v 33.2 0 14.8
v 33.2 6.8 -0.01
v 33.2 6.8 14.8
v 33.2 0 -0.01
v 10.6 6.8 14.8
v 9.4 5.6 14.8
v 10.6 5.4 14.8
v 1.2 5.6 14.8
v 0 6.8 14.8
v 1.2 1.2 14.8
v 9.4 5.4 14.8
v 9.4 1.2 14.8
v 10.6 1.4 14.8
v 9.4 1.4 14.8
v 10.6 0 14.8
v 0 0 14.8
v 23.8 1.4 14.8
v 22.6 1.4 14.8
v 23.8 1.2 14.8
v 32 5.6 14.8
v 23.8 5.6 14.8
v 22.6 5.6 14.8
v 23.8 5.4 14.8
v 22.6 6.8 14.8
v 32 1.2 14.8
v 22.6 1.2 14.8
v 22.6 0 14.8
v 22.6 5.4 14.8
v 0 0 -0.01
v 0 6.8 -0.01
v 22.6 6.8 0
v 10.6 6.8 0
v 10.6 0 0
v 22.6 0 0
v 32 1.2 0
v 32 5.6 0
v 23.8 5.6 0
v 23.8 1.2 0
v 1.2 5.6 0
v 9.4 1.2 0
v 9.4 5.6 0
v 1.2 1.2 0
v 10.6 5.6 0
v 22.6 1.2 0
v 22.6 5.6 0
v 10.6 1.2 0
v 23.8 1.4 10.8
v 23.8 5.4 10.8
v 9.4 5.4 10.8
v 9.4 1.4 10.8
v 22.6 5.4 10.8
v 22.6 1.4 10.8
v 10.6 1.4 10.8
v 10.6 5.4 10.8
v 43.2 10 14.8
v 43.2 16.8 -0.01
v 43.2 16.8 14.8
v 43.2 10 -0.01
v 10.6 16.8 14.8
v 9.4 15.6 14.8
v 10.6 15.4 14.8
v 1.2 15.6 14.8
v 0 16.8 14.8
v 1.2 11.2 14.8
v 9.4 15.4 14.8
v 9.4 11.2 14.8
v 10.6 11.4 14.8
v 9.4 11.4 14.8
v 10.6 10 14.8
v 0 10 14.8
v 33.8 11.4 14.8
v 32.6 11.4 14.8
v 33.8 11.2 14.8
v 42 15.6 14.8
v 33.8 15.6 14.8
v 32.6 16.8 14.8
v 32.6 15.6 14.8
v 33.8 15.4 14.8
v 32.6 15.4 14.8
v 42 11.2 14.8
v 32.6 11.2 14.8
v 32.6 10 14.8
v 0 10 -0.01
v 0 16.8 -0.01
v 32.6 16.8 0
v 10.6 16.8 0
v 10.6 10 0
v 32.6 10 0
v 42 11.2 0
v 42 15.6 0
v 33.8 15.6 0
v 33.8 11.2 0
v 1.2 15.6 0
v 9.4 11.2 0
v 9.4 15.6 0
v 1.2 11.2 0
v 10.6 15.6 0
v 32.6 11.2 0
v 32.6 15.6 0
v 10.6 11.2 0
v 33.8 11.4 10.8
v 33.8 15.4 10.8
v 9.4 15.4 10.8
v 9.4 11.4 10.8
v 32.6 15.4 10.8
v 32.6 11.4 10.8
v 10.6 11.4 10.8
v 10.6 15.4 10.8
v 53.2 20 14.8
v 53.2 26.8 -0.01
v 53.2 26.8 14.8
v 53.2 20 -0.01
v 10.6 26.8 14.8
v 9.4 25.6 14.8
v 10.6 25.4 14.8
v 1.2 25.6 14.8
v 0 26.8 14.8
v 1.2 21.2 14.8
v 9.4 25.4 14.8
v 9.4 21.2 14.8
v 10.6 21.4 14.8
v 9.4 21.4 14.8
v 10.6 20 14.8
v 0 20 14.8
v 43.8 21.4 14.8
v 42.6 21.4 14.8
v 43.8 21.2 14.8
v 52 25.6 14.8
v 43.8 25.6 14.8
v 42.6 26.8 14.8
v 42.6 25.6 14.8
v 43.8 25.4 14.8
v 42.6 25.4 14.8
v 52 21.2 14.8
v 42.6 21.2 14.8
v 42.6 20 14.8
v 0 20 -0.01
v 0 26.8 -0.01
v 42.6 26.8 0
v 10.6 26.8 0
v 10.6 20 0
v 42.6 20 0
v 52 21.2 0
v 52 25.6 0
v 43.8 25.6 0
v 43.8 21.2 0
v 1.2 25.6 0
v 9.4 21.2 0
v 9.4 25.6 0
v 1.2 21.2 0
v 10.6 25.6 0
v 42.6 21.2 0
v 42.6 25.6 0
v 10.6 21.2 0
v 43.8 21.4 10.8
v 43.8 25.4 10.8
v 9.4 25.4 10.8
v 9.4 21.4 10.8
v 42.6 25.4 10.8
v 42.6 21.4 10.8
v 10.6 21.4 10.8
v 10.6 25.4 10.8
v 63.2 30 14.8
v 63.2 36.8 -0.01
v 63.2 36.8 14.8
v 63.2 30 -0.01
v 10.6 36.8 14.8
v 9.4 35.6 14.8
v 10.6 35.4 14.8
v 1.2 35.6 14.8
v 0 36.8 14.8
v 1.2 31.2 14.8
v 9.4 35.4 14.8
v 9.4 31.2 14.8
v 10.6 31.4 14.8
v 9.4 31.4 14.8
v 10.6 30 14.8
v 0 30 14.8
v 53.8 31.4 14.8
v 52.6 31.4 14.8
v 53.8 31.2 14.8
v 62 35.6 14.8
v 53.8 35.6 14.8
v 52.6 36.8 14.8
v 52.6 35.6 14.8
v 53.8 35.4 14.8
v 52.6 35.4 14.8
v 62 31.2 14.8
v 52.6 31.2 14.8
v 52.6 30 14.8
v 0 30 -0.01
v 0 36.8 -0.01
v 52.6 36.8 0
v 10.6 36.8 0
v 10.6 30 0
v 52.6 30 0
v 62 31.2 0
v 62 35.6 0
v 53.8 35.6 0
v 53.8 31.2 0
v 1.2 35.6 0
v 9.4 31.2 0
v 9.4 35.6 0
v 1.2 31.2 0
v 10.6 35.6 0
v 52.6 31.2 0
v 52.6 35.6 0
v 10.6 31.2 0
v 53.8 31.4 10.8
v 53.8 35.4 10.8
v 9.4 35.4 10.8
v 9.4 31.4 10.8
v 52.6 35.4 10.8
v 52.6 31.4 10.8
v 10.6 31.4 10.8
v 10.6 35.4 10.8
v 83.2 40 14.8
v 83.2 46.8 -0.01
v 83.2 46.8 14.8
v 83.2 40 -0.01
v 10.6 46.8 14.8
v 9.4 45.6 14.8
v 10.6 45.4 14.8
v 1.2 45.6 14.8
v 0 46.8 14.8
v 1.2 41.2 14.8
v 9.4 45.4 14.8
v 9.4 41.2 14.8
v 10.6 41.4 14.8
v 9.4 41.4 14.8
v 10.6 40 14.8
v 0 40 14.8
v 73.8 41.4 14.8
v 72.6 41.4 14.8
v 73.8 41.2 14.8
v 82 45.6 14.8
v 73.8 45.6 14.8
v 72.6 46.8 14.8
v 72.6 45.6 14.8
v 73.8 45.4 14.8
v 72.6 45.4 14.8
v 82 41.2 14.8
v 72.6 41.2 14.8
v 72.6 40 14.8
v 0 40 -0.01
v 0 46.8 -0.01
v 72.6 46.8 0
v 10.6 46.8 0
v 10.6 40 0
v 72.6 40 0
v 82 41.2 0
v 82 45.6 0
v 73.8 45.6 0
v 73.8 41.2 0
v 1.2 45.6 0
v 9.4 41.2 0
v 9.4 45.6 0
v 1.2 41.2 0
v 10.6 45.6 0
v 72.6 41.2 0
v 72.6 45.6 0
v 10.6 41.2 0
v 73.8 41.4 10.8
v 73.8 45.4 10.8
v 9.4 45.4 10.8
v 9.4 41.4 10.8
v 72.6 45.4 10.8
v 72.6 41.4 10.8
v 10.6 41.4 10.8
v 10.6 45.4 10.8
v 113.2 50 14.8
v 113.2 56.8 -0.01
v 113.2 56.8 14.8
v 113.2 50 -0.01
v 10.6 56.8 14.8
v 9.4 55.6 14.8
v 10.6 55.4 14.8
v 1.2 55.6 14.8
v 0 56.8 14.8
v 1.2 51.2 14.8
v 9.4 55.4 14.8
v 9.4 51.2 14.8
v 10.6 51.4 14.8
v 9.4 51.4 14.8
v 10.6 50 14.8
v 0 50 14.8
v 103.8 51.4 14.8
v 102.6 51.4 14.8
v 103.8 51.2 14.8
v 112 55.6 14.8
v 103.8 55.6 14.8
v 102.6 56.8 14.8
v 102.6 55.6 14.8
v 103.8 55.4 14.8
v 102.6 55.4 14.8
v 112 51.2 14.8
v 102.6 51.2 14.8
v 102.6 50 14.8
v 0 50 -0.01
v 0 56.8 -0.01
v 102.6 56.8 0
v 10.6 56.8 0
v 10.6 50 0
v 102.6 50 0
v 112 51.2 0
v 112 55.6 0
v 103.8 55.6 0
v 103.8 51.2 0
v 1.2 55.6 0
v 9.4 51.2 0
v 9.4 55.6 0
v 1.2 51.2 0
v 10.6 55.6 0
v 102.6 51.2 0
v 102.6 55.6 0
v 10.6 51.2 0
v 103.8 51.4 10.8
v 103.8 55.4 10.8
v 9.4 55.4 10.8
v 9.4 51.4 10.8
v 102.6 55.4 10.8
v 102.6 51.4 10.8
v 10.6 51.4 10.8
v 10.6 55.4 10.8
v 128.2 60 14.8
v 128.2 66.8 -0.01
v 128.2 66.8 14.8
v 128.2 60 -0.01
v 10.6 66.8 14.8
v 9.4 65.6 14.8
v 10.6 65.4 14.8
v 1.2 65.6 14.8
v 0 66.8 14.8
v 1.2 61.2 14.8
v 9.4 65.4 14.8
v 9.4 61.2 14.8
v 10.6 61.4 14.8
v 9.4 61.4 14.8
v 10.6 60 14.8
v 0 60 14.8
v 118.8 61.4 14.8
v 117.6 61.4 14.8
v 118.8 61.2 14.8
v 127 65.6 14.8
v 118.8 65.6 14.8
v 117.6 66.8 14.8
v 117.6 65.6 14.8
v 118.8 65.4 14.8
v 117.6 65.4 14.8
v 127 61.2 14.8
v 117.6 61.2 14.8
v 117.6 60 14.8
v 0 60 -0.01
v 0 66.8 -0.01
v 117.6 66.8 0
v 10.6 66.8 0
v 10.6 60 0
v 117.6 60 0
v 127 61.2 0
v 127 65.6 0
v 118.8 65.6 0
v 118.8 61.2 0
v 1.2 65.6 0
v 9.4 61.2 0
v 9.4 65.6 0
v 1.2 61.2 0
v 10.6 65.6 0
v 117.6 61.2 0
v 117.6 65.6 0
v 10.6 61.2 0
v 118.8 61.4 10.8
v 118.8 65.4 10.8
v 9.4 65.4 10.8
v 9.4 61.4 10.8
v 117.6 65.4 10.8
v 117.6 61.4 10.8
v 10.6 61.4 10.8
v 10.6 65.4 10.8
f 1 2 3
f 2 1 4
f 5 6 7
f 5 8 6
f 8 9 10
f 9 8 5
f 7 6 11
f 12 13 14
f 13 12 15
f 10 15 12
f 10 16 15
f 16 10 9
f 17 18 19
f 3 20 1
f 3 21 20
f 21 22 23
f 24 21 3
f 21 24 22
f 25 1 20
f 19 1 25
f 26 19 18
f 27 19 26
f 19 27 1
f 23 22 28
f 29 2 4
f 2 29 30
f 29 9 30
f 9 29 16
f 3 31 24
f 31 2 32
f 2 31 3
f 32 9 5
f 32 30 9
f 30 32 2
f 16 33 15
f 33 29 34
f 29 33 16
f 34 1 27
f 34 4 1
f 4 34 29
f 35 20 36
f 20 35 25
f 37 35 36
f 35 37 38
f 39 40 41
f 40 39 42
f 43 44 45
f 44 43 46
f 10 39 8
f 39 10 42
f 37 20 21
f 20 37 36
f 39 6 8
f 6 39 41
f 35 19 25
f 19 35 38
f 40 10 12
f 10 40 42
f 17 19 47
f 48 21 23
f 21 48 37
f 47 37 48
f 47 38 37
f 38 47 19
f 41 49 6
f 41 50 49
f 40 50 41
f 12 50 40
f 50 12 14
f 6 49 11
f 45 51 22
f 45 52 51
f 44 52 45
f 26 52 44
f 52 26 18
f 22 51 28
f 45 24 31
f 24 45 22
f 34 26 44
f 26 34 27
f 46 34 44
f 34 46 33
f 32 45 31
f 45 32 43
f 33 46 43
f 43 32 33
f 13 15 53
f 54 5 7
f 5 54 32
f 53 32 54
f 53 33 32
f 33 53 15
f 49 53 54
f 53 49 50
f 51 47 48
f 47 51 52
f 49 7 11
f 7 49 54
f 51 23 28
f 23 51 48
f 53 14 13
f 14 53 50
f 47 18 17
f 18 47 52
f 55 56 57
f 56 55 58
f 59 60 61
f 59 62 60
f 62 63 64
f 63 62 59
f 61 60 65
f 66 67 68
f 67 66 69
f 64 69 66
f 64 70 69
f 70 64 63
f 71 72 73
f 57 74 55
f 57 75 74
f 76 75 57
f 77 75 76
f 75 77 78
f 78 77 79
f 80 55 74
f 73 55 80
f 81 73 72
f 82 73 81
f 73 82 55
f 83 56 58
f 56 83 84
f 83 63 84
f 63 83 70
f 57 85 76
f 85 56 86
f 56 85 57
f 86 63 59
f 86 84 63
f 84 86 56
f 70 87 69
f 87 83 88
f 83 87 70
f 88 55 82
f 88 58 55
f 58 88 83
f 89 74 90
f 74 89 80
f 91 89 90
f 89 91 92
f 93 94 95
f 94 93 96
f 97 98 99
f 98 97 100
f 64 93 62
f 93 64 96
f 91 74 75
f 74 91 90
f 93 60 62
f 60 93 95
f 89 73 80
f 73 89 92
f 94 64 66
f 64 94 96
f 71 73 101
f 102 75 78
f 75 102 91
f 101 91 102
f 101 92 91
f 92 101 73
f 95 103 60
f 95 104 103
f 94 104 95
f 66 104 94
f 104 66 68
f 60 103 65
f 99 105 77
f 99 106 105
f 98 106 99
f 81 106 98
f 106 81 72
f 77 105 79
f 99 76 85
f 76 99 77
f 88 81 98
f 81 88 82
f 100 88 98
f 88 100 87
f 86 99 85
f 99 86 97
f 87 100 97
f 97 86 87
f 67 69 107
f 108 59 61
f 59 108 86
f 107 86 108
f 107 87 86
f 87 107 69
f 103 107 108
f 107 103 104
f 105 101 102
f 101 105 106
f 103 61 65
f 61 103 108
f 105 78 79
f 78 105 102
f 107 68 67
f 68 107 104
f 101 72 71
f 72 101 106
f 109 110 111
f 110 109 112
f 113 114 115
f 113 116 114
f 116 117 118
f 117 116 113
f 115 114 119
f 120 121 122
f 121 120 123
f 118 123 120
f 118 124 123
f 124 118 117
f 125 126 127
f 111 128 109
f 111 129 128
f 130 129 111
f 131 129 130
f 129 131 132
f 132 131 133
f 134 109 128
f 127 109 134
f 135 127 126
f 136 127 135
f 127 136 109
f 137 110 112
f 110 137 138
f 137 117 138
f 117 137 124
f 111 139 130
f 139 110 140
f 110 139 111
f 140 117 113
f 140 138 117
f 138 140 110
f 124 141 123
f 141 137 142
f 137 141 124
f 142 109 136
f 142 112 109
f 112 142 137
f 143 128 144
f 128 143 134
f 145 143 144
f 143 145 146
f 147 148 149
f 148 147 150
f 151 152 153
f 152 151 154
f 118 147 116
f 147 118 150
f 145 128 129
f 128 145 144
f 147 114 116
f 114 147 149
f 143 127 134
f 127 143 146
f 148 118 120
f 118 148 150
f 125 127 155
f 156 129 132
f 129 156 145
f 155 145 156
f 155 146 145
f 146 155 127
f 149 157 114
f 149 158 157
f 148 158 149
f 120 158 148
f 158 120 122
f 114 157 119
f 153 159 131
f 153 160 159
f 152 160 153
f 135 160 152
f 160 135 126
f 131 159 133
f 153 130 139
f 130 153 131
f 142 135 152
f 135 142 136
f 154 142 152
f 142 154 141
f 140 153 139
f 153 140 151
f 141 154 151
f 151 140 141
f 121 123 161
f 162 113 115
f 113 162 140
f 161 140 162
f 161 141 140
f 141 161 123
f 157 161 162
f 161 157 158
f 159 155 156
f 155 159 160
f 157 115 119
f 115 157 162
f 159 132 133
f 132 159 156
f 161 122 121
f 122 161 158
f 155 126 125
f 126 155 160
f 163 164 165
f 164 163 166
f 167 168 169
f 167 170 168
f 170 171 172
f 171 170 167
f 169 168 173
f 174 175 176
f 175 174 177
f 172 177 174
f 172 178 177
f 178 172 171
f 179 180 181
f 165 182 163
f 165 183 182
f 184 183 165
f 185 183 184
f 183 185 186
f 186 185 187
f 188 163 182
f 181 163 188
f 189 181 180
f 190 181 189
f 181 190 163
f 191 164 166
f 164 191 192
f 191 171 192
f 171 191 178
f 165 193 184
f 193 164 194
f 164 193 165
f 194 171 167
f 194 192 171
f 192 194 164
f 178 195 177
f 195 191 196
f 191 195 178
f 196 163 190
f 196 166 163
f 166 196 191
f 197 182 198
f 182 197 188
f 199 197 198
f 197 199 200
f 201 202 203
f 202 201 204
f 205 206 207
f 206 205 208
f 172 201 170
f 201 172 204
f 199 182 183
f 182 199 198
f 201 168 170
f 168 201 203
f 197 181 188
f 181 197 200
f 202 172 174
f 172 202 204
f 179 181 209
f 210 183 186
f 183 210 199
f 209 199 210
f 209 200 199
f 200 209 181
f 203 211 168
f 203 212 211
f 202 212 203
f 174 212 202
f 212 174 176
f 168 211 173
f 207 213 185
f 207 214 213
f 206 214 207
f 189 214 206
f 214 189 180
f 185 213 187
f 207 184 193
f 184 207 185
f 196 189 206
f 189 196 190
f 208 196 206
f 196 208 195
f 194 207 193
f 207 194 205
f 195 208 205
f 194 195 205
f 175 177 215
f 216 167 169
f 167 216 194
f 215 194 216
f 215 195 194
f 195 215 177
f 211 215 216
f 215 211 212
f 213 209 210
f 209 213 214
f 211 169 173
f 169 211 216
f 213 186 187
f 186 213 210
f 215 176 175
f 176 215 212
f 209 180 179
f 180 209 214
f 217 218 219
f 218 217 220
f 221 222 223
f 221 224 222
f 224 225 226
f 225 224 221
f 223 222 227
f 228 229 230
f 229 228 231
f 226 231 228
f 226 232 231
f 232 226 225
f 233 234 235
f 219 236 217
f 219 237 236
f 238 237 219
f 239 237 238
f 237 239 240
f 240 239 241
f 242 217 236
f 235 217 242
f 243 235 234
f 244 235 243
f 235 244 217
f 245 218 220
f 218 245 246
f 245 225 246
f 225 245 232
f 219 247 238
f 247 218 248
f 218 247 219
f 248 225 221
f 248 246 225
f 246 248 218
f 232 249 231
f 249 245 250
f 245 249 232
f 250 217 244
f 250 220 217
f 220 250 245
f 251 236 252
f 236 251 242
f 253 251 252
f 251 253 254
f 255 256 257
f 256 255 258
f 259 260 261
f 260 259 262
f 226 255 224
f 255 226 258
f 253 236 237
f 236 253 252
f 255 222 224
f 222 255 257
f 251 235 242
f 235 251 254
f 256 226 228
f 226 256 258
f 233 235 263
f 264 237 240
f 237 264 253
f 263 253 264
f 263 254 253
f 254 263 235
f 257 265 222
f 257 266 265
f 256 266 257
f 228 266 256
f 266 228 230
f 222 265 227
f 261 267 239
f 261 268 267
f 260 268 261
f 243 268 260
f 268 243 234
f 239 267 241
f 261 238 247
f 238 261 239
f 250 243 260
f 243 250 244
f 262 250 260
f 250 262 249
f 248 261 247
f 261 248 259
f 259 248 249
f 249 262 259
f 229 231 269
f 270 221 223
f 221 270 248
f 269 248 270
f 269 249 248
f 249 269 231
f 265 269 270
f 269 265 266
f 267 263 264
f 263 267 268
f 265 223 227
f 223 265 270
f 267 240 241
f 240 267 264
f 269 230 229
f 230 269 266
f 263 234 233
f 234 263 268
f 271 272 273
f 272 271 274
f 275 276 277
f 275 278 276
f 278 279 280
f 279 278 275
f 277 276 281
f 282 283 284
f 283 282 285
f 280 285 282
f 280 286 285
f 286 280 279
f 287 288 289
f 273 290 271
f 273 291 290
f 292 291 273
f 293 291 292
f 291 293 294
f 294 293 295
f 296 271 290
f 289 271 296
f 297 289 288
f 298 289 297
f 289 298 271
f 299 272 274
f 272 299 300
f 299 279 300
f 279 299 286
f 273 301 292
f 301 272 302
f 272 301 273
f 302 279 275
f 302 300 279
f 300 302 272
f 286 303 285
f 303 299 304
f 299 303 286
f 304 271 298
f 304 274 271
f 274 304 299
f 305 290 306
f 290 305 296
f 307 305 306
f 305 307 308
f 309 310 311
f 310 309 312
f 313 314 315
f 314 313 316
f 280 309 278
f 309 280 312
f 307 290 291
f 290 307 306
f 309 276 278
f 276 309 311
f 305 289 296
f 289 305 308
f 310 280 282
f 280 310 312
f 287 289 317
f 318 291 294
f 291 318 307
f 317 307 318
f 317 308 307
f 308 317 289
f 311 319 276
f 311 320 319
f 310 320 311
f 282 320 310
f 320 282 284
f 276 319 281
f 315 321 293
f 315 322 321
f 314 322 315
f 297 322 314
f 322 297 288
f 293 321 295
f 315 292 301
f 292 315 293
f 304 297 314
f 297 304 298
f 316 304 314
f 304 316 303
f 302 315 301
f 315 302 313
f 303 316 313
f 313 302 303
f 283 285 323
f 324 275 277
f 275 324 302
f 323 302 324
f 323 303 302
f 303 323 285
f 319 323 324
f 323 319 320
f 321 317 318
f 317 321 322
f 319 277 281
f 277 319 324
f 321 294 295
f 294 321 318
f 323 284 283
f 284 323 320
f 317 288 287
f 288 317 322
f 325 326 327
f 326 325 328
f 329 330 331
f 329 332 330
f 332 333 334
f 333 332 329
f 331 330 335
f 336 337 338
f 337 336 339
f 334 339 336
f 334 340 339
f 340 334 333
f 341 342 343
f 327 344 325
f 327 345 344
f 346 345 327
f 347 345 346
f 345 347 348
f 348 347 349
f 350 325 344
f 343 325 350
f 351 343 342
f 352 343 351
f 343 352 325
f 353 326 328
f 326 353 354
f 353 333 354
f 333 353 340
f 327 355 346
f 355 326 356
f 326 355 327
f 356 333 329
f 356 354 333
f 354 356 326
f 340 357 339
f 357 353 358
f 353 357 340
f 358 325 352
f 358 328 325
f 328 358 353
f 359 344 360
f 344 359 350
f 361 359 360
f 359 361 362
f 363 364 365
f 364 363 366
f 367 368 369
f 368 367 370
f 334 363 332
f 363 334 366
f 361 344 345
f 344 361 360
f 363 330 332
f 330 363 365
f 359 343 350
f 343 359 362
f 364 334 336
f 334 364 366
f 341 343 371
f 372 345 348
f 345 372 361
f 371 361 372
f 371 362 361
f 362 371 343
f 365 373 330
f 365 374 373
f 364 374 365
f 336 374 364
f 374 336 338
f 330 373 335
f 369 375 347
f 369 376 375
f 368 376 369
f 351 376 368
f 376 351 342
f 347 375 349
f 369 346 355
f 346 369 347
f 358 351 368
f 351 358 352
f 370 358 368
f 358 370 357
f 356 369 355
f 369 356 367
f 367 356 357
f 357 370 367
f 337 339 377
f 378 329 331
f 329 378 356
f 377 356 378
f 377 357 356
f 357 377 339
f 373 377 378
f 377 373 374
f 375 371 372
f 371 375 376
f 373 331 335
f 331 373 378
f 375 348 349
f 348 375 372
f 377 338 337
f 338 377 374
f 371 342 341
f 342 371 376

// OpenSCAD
// file: ../../Base/Boxes.scad
// Fischertechnik Box Foundation
// Pre-designed Boxes

use <Constants.scad>

include <PlacementOptions.scad>

box190Width = 190;
box190Depth = 130;
box130Width = 130;
box130Depth = 95;
boxUsageHeight = 33.9;
boxWallThickness = 2.4;
boxBaseThickness = 1.0;

// getBoxWallThickness()
// Gets the wall thickness of a Fischertechnik Box

function getBoxWallThickness() = boxWallThickness;

// Gets the usable height of a fischertechnik box
function getBoxUsageHeight() = boxUsageHeight;

// Gets the thickness of the Fischertechnik box base.
function getBoxBaseThickness() = boxBaseThickness;

// Gets the usable inner space of a Box 190 as an x/y-list
function getBox190Space() = [
    box190Width - 2*getBoxWallThickness(), 
    box190Depth - 2*getBoxWallThickness() ];

// Imports the Fischertechnik empty box 130x190 mm and places it at position 0,0
// 190x130 are the outer sizes, the inner space is slightly smaller. Use getBox190Space() to get the inner sizes.
// This module needs the STL file "Fischertechnik Box 130x190.stl" in the library path.
// The box is positioned that the usable inner space is at the 0,0,0 position. The

module Box190() {
    translate([-getBoxWallThickness(),-getBoxWallThickness(),-getBoxBaseThickness()])
        import("Fischertechnik Box 130x190.stl", convexity=3);
}

// Gets the usable inner space of a Box 130 as an x/y-list
function getBox130Space() = [
    box130Width - 2*getBoxWallThickness(), 
    box130Depth - 2*getBoxWallThickness() ];

// Imports the Fischertechnik empty box 95x130 mm and places it at position 0,0
// 190x130 are the outer sizes, the inner space is slightly smaller. Use getBox190Space() to get the inner sizes.
// This module needs the STL file "Fischertechnik Box 95x130.stl" in the library path.
// The box is positioned that the usable inner space is at the 0,0,0 position. The

module Box130() {
    translate([-getBoxWallThickness(),-getBoxWallThickness(),-getBoxBaseThickness()])
        import("Fischertechnik Box 95x130.stl", convexity=3);
}

// Creates a web at the specified box walls
// corner 0 = LowerLeft, 1 = UpperLeft, 2 = UpperRight, 3 = LowerRight
// side 0 = LeftOfCorner, 1 = RightOfCorner
// distance = Distance in mm from the corner
// box = inner width and depth of the box (default: Box 190)
// webWidth = length of the web (default is 3 mms)
// webThickness = thickness of the web (default is 1 mm)

module BoxWeb(corner, side, distance, box=getBox190Space(), webWidth=3, webThickness=1.0) {
    sink = getBoxWallThickness()/2;

    width = (corner % 2 == 0) ? 
            (side == LeftOfCorner ? webWidth : webThickness) :
            (side == LeftOfCorner ? webThickness : webWidth);

    depth = (corner % 2 == 0) ? 
            (side == RightOfCorner ? webWidth : webThickness) :
            (side == RightOfCorner ? webThickness : webWidth);
    
    xDiff = corner == LowerLeft ? 
                (side == LeftOfCorner ? -sink : distance) :
            (corner == UpperLeft ?                
                (side == LeftOfCorner ? distance : -sink) :
            (corner == UpperRight ?
                (side == LeftOfCorner ? box.x-webWidth+sink : box.x-distance-webThickness) :
                (side == LeftOfCorner ? box.x-distance-webThickness: box.x-webWidth+sink)));

    yDiff = corner == LowerLeft ? 
                (side == RightOfCorner ? -sink : distance) :
            (corner == UpperLeft ?
                (side == RightOfCorner ? box.y-distance : box.y-webWidth+sink) :
            (corner == UpperRight ?
                (side == RightOfCorner ? box.y-webWidth+sink : box.y-distance) :
                (side == RightOfCorner ? distance : -sink)));
    
    translate([xDiff, yDiff, -getExcess()])
        cube([width, depth, boxUsageHeight + 2*getExcess()]);
}
// file: ../../Base/Rotation.scad
// Fischertechnik Box Foundation
// Geometry Helpers Rotation

include <PlacementOptions.scad>

// getRotatedSpace(space, rotation=NoRotation)
// Rotates the space dependent on the specified rotation

function getRotatedSpace(space, rotation=NoRotation) = [
    (rotation == Rotate90 || rotation == Rotate270) ? space.y : space.x,
    (rotation == Rotate90 || rotation == Rotate270) ? space.x : space.y
];

// Rotates the given space around the fixed left lower corner
// space = the space the children needs as width/depth list [width,depth]
// rotation = 0 Rotate0 degrees, 1 Rotate90 degrees, 2 Rotate180 degrees, 3 Rotate270 degrees (equivalent to -90)

module RotateFix(space, rotation=Rotate0) {
    dy = (rotation == Rotate0 || rotation == Rotate270) ? 0 :
        (rotation == Rotate90) ? space.x :
        space.y;
    dx = (rotation < Rotate180) ? 0 :
        (rotation == Rotate180) ? space.x :
        space.y;
    
    translate([dx, dy, 0])
        rotate([0, 0, rotations[rotation]])
            children();
}
// file: ../../Base/Alignment.scad
// Fischertechnik Box Foundation
// Geometry Helpers Alignment

include <PlacementOptions.scad>

// getAlignedX(elementWidth, spaceWidth, align=AlignRight, offset=0)
// Gets the aligned X offset of an element with the given
// width in the given space.
// elementWidth = The width of the element to positon
// spaceWidth = The space where the element should be aligned
// align = 0 AlignLeft, 1 AlignCenter, 2 AlignRight
// offset = an optional offset from the aligned position. When
// aligned left or centered, then positive values are in X direction.
// When aligned right then positive values are in negative X direction.

function getAlignedX(elementWidth, spaceWidth, align=AlignRight, offset=0) =
    (align == AlignLeft) ?
        offset :
        ((align == AlignCenter) ?
        (spaceWidth - elementWidth)/2 + offset :
        spaceWidth - offset - elementWidth);

// getAlignedY(elementDepth, spaceDepth, align=AlignTop, offset=0)
// Gets the aligned Y offset of an element with the given
// depth in the given space.
// elementDepth = The depth of the element to positon
// spaceDepth = The space where the element should be aligned
// align = 0 AlignBottom, 1 AlignCenter, 2 AlignTop
// offset = an optional offset from the aligned position. When
// aligned bottom or centered, then positive values are in Y direction.
// When aligned top then positive values are in negative Y direction.

function getAlignedY(elementDepth, spaceDepth, align=AlignTop, offset=0) =
    (align == AlignBottom) ?
        offset :
        ((align == AlignCenter) ?
        (spaceDepth - elementDepth)/2 + offset :
        spaceDepth - offset - elementDepth);
// file: ../../Base/PlacementOptions.scad
// Fischertechnik Box Foundation
// Placement Options

// Alignment
NoAlign = 0;
AlignLeft = 1;
AlignBottom = 2;
AlignCenter = 3;
AlignRight = 4;
AlignTop = 5;

// Element rotation degree steps
rotations = [0, -90, -180, -270];

// Rotation
NoRotation = 0;
Rotate0 = 0;
Rotate90 = 1;
Rotate180 = 2;
Rotate270 = 3;

// Docking (seen from above)
NoDock = -1;
DockLeft = 0;
DockTop = 1;
DockRight = 2;
DockCorner = 2;
DockBottom = 3;

// Web corners
LowerLeft = 0;
UpperLeft = 1;
UpperRight = 2;
LowerRight = 3;

// Web position relative to corner
LeftOfCorner = 0;
RightOfCorner = 1;
// file: ../../Base/Placement.scad
// Fischertechnik Box Foundation
// Geometry Helpers Placement

use <Constants.scad>
use <Alignment.scad>
use <Rotation.scad>
use <Boxes.scad>

include <PlacementOptions.scad>

// Place(x=0, y=0, elementSpace=[0,0], alignX=AlignLeft, alignY=AlignBottom, rotation=Rotate0, boxSpace=getBox190Space())
// Places the child at the specified position
// y = Y-Position. This is a relative position when an X aligment is specified.
// x = X-Position. This is a relative position when an Y aligment is specified.
// elementSpace = space of the element to be placed [x,y]
// alignX = -1=NoAlign, 0 AlignLeft, 1 AlignCenter, 3 AlignRight (elementSpace and boxSpace required!)
// alignY = -1=NoAlign, 2 AlignBottom, 1 AlignCenter, 4 AlignTop (elementSpace and boxSpace required!)
// rotation = 0 Rotate0 0 degrees, 1 Rotate90 90 degrees, 
// 2 Rotate180 180 degrees, 3 Rotate270 270 degrees (equivalent to -90)
// boxSpace = Inner space of the box where the placement occurs [x,y] - default is Box 190x130 inner space

module Place(x=0, y=0, elementSpace=[0,0], 
  alignX=AlignLeft, alignY=AlignBottom, 
  rotation=NoRotation, boxSpace=getBox190Space()) {

    module Position(x, y, space, rotation=Rotate0) {
        translate([x, y, 0])
            RotateFix(space, rotation)
                children(0);
    }

    space = getRotatedSpace(elementSpace, rotation);
    alignedX = getAlignedX(space.x, boxSpace.x, alignX, x);
    alignedY = getAlignedY(space.y, boxSpace.y, alignY, y);
    Position(alignedX, alignedY, elementSpace, rotation)
        children(0);
}

// Center(space=getBox130Space(), elementSpace=[0,0])
// space = Space where the children is centered. For cylinder use centered=true and no elementSpace.
// elementSpace = space of the element to be centered [x,y]

module Center(space=getBox190Space(), elementSpace=[0,0]) {
    translate([(space.x - elementSpace.x) / 2, (space.y - elementSpace.y) / 2])
        children(0);
}

// CenterHorizontal(width=0, y=0, offset=0, space=getBox130Space())
// space = Space where the children is centered. For cylinder use centered=true and no elementSpace.
// elementSpace = space of the element to be centered [x,y]

module CenterHorizontal(width=0, y=0, offset=0, space=getBox190Space()) {
    translate([(space.x - width) / 2 + offset, y])
        children(0);
}

// CenterVertical(depth=0, x=0, offset=0, space=getBox130Space())
// space = Space where the children is centered. For cylinder use centered=true and no elementSpace.
// elementSpace = space of the element to be centered [x,y]

module CenterVerticalal(depth=0, x=0, offset=0, space=getBox190Space()) {
    translate([x, (space.y - depth) / 2 + offset])
        children(0);
}
// file: ../../Base/Constants.scad
// Fischertechnik Box Foundation
// Constants

// Constant values necessary for multiple elements

// Base constants
dividerThickness = 1.2;
excess = 0.01;
fragments = 90;
tolerance = 0.8;

// Gets the thickness of a divider 
function getDividerThickness() = dividerThickness;

// Gets the excess that is used to merge walls into each other
function getExcess() = excess;

// Gets amount of fragments of a cylinder
function getFragments() = fragments;

// Gets the inner tolerance of a frame to each side
function getTolerance() = tolerance;


// Fischertechnik specific constants
axisDiameter = 4;
axisBottomDiameter = axisDiameter + 1;
standardEdgeDistance = 2.5;
standardWebDistance = 11.5;
standardCornerLength = 15;
tubeWallFactor = 1.6;

// Gets axis diameter
function getAxisDiameter() = axisDiameter;

// Gets axis bottom diameter for thicker part at the bottom
function getAxisBottomDiameter() = axisBottomDiameter;

// gets the standard distance to the wall of the box for dockable frames with webs
function getStandardEdgeDistance() = standardEdgeDistance;

// gets the standard distance of each web to the corner of the dockable frame
function getStandardWebDistance() = standardWebDistance;

// gets the standard length of the corner walls of a dockable frame
function getStandardCornerLength() = standardCornerLength;

// gets the wall thickness of a tube.
function getTubeWallThickness() = tubeWallFactor * getDividerThickness();
// main file
// Fischertechnik Box Foundation
// ModelBase
// Test FrameAxis

use <../../Base/Constants.scad>
use <../../ModelBase/Complex.scad>

FrameAxis(30);

translate([0, 10, 0])
    FrameAxis(40);

translate([0, 20, 0])
    FrameAxis(50);

translate([0, 30, 0])
    FrameAxis(60);

translate([0, 40, 0])
    FrameAxis(80);

translate([0, 50, 0])
    FrameAxis(110);

translate([0, 60, 0])
    FrameAxis(125);
